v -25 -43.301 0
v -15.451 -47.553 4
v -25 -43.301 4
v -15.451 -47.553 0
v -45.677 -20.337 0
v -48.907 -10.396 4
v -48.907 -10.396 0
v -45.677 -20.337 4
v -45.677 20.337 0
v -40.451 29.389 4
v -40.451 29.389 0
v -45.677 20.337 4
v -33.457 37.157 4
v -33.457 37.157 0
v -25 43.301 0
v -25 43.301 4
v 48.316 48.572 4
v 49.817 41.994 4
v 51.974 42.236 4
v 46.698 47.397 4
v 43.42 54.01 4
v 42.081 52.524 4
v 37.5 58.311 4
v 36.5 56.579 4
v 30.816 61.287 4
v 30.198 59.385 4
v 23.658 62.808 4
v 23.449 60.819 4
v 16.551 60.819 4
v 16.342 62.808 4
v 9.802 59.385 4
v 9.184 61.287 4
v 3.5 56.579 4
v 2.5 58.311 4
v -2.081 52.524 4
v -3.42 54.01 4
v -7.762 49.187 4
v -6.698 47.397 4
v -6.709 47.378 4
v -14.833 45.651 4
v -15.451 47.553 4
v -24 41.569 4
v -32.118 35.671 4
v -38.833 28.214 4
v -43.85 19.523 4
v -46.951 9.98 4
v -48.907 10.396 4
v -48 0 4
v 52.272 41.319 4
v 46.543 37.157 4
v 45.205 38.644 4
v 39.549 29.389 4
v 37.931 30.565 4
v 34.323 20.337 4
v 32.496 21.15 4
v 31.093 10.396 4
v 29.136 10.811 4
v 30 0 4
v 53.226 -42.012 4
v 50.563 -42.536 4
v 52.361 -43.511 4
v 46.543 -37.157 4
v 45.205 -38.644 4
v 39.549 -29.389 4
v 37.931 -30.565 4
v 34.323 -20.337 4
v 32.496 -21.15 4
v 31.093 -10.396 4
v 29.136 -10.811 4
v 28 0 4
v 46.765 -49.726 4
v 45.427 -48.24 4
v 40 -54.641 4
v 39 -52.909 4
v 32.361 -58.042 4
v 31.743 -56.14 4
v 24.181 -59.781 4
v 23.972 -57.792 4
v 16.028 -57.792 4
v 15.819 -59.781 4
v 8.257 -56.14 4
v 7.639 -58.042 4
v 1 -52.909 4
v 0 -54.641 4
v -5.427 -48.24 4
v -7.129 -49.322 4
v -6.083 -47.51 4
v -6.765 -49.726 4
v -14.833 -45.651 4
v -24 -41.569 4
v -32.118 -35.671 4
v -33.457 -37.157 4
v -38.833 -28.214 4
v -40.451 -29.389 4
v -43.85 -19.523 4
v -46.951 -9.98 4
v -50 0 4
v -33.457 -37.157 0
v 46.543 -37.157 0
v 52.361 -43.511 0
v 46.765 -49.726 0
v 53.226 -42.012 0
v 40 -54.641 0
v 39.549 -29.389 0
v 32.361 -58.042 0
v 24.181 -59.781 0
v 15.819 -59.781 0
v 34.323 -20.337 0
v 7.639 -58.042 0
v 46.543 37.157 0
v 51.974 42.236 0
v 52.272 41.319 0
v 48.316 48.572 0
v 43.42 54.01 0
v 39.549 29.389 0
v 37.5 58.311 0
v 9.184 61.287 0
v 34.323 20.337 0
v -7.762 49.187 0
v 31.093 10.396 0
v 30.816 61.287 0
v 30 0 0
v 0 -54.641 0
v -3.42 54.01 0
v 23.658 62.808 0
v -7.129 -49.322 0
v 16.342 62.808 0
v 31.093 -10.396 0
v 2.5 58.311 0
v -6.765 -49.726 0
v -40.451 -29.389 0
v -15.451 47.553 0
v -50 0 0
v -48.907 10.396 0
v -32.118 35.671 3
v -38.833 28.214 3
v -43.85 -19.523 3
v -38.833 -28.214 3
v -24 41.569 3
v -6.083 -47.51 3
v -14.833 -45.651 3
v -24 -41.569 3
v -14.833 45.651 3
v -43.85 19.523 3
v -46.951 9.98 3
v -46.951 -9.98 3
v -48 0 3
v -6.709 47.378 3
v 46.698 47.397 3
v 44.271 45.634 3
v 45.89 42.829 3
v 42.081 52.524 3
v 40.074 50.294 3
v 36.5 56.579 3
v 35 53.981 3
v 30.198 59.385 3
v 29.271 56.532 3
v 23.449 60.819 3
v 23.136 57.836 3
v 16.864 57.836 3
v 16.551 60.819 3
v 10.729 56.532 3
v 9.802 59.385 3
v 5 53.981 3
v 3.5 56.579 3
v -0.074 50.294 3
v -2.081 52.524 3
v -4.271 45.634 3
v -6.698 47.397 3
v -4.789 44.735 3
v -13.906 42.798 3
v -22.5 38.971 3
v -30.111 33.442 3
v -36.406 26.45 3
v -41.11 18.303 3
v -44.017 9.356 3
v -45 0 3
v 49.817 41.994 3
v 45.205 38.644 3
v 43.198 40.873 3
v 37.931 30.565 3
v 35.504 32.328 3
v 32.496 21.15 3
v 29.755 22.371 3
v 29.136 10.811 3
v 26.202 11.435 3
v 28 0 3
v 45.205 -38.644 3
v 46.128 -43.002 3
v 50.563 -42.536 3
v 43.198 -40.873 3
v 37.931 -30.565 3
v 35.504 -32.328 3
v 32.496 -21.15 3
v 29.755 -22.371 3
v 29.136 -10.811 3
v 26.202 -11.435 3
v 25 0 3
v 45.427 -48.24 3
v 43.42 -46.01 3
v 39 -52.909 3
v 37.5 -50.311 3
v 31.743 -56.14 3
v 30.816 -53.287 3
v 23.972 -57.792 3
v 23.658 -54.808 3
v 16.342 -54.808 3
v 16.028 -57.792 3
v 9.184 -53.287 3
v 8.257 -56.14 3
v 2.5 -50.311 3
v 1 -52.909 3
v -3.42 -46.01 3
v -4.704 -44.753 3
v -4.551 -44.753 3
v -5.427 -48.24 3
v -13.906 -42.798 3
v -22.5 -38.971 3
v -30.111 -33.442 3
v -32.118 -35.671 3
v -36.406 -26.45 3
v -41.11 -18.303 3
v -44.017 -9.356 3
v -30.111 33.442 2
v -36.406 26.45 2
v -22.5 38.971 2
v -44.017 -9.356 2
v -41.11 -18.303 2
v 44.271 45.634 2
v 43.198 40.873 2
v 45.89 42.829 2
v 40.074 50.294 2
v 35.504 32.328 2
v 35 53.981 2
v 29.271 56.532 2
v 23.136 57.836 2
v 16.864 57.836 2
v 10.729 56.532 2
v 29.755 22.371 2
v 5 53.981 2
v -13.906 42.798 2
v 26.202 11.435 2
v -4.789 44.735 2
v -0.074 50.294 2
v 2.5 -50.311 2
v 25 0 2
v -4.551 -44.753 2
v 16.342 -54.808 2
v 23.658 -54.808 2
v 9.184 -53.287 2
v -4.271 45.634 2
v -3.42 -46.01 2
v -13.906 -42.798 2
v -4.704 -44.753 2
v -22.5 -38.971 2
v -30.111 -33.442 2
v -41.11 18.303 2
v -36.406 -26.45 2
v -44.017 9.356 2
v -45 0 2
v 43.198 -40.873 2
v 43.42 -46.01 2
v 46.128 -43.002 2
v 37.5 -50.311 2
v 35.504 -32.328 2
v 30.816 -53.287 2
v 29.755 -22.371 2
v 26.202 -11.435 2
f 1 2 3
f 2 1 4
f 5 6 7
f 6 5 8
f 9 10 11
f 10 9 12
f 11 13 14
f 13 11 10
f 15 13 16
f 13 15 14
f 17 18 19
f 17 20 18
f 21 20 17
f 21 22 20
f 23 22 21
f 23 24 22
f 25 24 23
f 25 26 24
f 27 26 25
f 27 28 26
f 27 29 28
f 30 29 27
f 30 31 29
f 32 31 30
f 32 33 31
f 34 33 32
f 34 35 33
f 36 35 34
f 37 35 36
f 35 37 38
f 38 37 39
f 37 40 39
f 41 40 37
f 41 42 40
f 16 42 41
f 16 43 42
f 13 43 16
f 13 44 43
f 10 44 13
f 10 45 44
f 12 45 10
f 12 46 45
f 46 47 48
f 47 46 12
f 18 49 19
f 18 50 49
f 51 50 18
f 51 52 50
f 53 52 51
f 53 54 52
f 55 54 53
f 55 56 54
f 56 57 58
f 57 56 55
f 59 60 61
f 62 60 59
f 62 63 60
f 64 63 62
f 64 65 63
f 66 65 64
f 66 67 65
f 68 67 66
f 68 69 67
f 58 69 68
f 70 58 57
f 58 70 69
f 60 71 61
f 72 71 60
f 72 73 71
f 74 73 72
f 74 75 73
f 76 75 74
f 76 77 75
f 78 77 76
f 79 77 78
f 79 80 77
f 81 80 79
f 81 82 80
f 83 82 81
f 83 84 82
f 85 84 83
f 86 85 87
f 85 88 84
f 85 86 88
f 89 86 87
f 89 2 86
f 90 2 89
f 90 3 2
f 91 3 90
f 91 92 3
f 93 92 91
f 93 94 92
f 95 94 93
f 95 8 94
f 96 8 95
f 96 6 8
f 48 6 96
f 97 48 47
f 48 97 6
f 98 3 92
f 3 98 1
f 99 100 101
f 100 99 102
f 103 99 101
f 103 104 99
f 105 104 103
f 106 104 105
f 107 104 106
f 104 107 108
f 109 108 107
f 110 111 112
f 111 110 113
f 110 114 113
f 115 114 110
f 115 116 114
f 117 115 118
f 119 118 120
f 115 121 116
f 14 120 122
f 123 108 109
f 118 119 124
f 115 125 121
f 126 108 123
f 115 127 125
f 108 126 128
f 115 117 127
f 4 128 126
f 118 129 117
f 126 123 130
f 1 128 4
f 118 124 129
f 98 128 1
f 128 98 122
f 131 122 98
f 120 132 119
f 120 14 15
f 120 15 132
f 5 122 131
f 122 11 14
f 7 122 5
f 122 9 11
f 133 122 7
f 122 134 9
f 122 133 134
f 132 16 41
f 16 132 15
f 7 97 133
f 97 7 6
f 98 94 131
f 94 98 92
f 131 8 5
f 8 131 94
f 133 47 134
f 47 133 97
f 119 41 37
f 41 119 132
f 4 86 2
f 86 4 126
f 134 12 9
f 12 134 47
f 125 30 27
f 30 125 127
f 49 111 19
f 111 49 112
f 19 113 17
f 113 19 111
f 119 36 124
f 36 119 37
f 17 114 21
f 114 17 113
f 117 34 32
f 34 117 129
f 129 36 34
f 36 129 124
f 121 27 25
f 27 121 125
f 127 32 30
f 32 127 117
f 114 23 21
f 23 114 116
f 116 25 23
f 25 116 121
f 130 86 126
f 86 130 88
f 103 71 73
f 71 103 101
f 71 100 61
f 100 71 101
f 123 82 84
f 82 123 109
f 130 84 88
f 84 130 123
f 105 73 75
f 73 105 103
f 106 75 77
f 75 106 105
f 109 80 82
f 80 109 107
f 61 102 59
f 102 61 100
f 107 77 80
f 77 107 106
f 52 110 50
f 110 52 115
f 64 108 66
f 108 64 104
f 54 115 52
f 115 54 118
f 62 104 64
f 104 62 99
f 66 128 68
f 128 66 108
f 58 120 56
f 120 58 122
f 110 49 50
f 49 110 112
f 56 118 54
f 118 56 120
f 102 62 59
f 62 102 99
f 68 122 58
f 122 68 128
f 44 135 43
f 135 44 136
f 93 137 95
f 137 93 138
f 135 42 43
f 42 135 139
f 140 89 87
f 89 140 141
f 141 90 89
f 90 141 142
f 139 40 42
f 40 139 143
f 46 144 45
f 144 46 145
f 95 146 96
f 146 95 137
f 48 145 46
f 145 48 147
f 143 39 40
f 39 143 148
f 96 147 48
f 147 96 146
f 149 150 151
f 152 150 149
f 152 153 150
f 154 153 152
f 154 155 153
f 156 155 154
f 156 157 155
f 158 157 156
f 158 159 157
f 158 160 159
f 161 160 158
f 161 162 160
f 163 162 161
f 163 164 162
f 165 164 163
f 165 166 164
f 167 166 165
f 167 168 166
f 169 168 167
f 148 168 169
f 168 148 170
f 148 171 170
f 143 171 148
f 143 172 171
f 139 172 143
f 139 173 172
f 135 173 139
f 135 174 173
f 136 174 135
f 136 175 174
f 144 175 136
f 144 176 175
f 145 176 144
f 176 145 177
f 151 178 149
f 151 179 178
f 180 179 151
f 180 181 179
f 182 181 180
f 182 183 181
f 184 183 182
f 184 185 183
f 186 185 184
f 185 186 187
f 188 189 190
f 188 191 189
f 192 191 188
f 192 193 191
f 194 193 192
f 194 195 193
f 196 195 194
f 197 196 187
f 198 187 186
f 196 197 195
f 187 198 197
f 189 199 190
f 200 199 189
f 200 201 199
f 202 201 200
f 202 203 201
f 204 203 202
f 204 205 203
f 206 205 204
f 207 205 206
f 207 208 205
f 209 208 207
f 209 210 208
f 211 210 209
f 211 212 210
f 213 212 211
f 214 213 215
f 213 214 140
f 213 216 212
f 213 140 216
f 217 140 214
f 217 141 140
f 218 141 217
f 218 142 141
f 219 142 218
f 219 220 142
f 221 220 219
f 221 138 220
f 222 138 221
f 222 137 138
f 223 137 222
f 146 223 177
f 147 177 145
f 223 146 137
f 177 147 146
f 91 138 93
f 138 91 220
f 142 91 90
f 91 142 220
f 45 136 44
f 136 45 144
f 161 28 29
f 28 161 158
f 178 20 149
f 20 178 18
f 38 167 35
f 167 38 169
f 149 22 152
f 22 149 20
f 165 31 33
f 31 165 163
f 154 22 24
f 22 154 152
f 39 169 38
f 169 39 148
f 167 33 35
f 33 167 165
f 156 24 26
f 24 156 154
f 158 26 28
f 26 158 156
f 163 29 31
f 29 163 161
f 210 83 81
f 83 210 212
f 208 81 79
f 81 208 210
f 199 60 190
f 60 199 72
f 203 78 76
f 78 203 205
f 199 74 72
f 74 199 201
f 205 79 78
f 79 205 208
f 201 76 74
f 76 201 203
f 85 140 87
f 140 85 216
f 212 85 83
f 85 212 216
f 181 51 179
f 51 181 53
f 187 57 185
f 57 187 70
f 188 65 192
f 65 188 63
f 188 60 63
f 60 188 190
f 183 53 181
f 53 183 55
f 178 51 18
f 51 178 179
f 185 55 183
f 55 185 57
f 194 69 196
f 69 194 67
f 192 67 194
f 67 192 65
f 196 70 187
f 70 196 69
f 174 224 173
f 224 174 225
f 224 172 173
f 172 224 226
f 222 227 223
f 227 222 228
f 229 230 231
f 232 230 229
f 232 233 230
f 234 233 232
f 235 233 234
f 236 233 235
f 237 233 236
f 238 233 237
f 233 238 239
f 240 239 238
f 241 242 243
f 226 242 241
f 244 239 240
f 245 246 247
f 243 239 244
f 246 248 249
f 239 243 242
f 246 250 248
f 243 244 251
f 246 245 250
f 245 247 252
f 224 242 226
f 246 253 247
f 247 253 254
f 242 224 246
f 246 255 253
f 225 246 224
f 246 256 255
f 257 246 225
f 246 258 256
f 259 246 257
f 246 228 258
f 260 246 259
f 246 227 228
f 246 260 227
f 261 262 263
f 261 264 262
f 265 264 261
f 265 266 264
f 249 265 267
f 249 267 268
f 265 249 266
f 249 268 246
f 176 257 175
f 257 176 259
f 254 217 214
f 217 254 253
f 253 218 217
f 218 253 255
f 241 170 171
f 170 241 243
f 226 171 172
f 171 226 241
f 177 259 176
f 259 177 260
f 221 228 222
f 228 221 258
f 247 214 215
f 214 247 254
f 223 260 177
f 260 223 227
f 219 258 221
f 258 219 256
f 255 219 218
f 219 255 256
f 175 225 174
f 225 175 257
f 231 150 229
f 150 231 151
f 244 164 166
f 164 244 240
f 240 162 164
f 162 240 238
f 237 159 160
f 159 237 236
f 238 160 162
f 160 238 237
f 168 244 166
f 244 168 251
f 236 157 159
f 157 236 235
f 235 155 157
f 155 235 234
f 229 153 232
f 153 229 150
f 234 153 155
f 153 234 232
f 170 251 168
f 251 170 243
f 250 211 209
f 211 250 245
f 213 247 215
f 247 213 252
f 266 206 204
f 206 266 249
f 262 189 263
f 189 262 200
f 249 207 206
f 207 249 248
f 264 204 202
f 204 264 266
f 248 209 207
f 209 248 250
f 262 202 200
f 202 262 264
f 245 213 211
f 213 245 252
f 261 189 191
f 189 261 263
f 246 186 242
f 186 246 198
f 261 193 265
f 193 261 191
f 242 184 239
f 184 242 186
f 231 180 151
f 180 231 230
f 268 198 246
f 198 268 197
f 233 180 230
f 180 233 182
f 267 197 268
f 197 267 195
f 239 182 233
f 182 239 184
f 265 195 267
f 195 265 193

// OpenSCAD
module pond(x) {
    difference() {
        union() {
            cylinder(d=100-x,h=4);
            translate([20,28,0]) cylinder(d=70-x,h=4);
            translate([20,-20,0]) cylinder(d=80-x,h=4);
        }
        translate([80,0,-1]) cylinder(d=100+x,h=6);
    }
}

difference() {
    pond(0);
    translate([0,0,3]) pond(4);
    translate([0,0,2]) pond(10);
}
